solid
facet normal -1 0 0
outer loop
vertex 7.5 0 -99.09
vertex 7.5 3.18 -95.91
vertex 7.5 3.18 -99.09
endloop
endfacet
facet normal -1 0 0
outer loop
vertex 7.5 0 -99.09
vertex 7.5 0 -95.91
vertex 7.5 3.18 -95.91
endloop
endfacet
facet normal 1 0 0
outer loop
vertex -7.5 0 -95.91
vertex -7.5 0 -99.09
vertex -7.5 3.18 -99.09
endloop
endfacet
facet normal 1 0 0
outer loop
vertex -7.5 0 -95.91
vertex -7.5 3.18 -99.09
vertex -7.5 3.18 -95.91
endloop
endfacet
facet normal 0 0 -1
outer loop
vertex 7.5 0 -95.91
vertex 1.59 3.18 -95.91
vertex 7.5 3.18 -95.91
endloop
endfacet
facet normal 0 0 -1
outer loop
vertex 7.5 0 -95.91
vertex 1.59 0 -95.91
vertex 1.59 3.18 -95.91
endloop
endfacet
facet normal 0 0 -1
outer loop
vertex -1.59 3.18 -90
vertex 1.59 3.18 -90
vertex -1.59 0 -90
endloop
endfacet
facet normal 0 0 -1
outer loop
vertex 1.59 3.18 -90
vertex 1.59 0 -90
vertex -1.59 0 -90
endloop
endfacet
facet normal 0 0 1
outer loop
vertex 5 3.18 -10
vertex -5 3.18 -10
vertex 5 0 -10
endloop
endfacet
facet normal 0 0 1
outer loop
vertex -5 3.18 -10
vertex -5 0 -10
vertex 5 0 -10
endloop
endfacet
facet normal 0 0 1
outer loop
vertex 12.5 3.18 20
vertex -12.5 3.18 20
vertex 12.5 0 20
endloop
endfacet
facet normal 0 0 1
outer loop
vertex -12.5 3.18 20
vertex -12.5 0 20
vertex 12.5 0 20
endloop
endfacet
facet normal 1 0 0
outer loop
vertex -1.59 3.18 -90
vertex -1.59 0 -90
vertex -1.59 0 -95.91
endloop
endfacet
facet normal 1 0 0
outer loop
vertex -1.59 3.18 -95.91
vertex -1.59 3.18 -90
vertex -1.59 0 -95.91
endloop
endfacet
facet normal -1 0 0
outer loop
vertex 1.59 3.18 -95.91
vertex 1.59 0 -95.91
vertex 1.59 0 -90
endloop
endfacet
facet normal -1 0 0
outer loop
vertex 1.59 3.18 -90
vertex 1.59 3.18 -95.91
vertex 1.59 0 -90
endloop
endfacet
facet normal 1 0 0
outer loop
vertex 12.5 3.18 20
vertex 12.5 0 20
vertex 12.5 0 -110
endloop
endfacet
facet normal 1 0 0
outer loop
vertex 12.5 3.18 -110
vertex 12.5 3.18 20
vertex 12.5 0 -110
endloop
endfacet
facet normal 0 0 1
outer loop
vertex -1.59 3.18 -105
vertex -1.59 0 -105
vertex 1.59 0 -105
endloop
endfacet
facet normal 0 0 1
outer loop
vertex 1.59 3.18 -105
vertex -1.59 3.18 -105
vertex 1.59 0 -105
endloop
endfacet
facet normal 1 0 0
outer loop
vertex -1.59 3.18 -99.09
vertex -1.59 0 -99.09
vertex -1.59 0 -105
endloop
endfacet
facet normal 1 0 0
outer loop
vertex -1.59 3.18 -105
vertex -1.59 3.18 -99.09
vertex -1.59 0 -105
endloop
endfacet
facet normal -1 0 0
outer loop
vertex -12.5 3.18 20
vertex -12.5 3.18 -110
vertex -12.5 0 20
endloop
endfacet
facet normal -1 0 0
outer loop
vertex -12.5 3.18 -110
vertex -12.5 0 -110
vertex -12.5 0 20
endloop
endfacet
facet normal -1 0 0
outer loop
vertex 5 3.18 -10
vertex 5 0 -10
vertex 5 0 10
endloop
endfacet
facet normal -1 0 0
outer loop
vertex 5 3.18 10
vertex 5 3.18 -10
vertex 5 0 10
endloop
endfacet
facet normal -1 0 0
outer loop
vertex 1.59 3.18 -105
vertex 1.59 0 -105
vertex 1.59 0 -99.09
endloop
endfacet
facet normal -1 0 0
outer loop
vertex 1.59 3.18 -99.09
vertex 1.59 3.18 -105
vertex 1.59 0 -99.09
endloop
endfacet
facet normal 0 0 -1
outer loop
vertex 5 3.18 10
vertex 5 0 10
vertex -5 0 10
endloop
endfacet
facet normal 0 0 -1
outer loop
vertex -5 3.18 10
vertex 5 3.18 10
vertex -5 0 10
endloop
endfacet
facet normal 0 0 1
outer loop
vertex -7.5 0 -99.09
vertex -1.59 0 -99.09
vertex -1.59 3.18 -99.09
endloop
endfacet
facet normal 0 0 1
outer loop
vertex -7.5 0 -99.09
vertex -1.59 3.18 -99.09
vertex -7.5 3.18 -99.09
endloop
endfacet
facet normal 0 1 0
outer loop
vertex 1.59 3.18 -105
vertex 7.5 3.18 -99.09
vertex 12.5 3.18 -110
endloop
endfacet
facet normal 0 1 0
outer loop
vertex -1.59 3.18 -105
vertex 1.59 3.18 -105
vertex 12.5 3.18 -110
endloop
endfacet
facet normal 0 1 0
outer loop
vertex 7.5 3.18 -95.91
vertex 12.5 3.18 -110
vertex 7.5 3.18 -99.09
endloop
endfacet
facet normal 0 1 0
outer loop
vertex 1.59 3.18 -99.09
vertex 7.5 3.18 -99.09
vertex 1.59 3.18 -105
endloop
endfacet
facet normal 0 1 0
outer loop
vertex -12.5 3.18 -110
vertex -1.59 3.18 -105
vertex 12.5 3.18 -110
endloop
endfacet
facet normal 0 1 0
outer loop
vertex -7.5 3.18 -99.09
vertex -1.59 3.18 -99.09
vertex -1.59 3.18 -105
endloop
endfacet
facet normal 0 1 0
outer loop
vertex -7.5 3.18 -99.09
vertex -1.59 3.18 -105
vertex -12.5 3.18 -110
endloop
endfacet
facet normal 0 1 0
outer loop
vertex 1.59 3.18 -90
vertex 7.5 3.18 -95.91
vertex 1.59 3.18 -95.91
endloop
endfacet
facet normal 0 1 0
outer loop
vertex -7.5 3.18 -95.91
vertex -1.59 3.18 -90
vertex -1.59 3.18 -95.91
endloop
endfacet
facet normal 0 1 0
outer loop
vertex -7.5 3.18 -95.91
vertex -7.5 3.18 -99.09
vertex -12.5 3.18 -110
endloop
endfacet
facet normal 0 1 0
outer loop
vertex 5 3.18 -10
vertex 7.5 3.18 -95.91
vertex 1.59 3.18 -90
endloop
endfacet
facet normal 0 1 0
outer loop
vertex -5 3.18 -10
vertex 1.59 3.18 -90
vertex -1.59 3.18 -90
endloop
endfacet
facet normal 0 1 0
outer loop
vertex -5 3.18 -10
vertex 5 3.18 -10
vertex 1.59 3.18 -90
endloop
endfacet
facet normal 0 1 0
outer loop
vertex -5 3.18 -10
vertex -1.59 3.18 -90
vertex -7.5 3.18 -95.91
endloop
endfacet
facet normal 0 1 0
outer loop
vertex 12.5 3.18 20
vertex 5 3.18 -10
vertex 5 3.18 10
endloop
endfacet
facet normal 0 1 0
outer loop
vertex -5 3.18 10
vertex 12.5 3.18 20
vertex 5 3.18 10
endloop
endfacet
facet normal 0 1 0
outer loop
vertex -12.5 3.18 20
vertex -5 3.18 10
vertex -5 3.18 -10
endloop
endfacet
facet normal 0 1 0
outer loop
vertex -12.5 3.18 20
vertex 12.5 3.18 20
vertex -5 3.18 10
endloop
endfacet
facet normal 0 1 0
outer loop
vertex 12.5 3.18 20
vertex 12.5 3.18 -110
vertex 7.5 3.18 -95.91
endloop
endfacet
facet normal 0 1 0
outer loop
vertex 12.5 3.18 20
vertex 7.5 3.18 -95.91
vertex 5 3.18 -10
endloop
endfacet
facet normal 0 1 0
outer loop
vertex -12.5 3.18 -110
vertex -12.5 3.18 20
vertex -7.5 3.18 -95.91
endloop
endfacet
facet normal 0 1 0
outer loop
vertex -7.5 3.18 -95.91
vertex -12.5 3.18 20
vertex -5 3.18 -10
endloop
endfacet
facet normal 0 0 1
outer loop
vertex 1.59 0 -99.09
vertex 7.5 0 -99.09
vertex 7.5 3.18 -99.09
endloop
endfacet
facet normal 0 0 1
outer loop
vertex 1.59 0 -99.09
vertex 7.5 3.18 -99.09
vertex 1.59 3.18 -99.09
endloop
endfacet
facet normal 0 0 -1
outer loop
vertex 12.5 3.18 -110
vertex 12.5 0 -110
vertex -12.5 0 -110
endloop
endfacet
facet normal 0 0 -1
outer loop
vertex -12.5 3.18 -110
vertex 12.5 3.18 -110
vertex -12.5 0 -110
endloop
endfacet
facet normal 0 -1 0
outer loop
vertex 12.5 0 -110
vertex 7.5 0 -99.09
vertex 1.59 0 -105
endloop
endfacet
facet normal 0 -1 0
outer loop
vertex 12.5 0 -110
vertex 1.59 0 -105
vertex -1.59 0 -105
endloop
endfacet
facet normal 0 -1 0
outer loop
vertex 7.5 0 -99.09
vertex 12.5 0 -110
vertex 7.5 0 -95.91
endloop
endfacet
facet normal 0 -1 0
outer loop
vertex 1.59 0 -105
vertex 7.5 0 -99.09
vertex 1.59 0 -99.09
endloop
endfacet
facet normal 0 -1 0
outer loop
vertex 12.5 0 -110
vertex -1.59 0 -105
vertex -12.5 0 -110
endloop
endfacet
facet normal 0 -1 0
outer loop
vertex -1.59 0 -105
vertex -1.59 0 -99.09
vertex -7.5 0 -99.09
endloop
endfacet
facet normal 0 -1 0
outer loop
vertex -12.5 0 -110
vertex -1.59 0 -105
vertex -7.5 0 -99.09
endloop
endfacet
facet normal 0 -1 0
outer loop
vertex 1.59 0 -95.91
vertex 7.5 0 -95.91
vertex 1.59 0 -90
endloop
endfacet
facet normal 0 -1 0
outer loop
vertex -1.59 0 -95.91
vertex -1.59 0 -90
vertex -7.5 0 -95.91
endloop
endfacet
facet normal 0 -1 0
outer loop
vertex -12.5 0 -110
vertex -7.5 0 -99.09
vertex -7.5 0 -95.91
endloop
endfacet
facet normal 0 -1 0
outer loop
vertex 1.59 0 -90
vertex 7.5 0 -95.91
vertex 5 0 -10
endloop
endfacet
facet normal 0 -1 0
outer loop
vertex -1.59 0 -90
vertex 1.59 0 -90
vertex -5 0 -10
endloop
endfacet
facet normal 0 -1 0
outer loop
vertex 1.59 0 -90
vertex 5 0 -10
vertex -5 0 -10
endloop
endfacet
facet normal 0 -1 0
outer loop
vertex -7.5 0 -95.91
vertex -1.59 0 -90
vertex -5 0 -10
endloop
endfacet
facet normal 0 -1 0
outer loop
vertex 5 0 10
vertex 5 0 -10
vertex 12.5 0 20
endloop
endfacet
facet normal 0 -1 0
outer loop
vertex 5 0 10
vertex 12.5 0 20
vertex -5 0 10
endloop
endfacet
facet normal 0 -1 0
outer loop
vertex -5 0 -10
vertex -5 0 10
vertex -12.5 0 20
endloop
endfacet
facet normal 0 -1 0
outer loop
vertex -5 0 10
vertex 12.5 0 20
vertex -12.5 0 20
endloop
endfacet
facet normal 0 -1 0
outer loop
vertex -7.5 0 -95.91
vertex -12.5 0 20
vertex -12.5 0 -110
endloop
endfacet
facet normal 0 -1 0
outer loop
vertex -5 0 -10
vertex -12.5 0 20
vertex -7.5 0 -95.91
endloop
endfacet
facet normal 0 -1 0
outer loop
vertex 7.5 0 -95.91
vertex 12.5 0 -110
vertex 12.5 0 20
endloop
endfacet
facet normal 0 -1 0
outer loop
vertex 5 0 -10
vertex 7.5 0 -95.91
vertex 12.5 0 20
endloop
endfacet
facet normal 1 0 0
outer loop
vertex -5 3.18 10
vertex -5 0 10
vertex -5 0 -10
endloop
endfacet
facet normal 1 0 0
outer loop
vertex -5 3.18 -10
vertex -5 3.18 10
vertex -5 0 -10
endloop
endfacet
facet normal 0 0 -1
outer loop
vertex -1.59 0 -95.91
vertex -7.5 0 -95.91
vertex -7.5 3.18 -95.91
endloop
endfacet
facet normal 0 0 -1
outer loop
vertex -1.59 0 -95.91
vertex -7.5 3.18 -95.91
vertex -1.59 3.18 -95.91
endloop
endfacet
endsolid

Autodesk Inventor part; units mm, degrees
ref_plane "YZ Plane" through (0, 0, 0) normal (1, 0, 0) x (0, 1, 0)
ref_plane "XZ Plane" through (0, 0, 0) normal (0, 1, 0) x (-1, 0, 0)
ref_plane "XY Plane" through (0, 0, 0) normal (0, 0, 1) x (1, 0, 0)
sketch "Sketch1" plane through (0, 0, 0) normal (0, 1, 0) x (-1, 0, 0)
  line L0 (-5, 10) -> (5, 10)
  line L1 (5, 10) -> (5, -10)
  line L2 (5, -10) -> (-5, -10)
  line L3 (-5, -10) -> (-5, 10)
  line L4 (-5, 10) -> (5, -10) construction
  line L5 (5, 10) -> (-5, -10) construction
  line L6 (12.5, 20) -> (-12.5, 20)
  line L7 (-12.5, 20) -> (-12.5, -110)
  line L8 (-12.5, -110) -> (12.5, -110)
  line L9 (12.5, -110) -> (12.5, 20)
  line L10 (1.59, -105) -> (-1.59, -105)
  line L11 (-1.59, -105) -> (-1.59, -90)
  line L12 (-1.59, -90) -> (1.59, -90)
  line L13 (1.59, -90) -> (1.59, -105)
  line L14 (1.59, -105) -> (-1.59, -90) construction
  line L15 (-1.59, -105) -> (1.59, -90) construction
  line L16 (7.5, -95.91) -> (-7.5, -95.91)
  line L17 (-7.5, -95.91) -> (-7.5, -99.09)
  line L18 (-7.5, -99.09) -> (7.5, -99.09)
  line L19 (7.5, -99.09) -> (7.5, -95.91)
  line L20 (7.5, -95.91) -> (-7.5, -99.09) construction
  line L21 (-7.5, -95.91) -> (7.5, -99.09) construction
  point P0 (0, 0)
  point P1 (0, 0)
  point P2 (0, 0)
  point P3 (0, -97.5)
  dimension "d24" = 10
  dimension "d25" = 20
  dimension "d26" = 25
  dimension "d27" = 130
  dimension "d28" = 20
  dimension "d29" = 12.5
  dimension "d37" = 3.18
  dimension "d38" = 15
  dimension "d39" = 15
  dimension "d40" = 3.18
  dimension "d41" = 12.5
  dimension "d42" = 12.5
extrude "Extrusion3" add sketch "Sketch1" along normal blind 3.18
properties part number "Brazo_Superior"
